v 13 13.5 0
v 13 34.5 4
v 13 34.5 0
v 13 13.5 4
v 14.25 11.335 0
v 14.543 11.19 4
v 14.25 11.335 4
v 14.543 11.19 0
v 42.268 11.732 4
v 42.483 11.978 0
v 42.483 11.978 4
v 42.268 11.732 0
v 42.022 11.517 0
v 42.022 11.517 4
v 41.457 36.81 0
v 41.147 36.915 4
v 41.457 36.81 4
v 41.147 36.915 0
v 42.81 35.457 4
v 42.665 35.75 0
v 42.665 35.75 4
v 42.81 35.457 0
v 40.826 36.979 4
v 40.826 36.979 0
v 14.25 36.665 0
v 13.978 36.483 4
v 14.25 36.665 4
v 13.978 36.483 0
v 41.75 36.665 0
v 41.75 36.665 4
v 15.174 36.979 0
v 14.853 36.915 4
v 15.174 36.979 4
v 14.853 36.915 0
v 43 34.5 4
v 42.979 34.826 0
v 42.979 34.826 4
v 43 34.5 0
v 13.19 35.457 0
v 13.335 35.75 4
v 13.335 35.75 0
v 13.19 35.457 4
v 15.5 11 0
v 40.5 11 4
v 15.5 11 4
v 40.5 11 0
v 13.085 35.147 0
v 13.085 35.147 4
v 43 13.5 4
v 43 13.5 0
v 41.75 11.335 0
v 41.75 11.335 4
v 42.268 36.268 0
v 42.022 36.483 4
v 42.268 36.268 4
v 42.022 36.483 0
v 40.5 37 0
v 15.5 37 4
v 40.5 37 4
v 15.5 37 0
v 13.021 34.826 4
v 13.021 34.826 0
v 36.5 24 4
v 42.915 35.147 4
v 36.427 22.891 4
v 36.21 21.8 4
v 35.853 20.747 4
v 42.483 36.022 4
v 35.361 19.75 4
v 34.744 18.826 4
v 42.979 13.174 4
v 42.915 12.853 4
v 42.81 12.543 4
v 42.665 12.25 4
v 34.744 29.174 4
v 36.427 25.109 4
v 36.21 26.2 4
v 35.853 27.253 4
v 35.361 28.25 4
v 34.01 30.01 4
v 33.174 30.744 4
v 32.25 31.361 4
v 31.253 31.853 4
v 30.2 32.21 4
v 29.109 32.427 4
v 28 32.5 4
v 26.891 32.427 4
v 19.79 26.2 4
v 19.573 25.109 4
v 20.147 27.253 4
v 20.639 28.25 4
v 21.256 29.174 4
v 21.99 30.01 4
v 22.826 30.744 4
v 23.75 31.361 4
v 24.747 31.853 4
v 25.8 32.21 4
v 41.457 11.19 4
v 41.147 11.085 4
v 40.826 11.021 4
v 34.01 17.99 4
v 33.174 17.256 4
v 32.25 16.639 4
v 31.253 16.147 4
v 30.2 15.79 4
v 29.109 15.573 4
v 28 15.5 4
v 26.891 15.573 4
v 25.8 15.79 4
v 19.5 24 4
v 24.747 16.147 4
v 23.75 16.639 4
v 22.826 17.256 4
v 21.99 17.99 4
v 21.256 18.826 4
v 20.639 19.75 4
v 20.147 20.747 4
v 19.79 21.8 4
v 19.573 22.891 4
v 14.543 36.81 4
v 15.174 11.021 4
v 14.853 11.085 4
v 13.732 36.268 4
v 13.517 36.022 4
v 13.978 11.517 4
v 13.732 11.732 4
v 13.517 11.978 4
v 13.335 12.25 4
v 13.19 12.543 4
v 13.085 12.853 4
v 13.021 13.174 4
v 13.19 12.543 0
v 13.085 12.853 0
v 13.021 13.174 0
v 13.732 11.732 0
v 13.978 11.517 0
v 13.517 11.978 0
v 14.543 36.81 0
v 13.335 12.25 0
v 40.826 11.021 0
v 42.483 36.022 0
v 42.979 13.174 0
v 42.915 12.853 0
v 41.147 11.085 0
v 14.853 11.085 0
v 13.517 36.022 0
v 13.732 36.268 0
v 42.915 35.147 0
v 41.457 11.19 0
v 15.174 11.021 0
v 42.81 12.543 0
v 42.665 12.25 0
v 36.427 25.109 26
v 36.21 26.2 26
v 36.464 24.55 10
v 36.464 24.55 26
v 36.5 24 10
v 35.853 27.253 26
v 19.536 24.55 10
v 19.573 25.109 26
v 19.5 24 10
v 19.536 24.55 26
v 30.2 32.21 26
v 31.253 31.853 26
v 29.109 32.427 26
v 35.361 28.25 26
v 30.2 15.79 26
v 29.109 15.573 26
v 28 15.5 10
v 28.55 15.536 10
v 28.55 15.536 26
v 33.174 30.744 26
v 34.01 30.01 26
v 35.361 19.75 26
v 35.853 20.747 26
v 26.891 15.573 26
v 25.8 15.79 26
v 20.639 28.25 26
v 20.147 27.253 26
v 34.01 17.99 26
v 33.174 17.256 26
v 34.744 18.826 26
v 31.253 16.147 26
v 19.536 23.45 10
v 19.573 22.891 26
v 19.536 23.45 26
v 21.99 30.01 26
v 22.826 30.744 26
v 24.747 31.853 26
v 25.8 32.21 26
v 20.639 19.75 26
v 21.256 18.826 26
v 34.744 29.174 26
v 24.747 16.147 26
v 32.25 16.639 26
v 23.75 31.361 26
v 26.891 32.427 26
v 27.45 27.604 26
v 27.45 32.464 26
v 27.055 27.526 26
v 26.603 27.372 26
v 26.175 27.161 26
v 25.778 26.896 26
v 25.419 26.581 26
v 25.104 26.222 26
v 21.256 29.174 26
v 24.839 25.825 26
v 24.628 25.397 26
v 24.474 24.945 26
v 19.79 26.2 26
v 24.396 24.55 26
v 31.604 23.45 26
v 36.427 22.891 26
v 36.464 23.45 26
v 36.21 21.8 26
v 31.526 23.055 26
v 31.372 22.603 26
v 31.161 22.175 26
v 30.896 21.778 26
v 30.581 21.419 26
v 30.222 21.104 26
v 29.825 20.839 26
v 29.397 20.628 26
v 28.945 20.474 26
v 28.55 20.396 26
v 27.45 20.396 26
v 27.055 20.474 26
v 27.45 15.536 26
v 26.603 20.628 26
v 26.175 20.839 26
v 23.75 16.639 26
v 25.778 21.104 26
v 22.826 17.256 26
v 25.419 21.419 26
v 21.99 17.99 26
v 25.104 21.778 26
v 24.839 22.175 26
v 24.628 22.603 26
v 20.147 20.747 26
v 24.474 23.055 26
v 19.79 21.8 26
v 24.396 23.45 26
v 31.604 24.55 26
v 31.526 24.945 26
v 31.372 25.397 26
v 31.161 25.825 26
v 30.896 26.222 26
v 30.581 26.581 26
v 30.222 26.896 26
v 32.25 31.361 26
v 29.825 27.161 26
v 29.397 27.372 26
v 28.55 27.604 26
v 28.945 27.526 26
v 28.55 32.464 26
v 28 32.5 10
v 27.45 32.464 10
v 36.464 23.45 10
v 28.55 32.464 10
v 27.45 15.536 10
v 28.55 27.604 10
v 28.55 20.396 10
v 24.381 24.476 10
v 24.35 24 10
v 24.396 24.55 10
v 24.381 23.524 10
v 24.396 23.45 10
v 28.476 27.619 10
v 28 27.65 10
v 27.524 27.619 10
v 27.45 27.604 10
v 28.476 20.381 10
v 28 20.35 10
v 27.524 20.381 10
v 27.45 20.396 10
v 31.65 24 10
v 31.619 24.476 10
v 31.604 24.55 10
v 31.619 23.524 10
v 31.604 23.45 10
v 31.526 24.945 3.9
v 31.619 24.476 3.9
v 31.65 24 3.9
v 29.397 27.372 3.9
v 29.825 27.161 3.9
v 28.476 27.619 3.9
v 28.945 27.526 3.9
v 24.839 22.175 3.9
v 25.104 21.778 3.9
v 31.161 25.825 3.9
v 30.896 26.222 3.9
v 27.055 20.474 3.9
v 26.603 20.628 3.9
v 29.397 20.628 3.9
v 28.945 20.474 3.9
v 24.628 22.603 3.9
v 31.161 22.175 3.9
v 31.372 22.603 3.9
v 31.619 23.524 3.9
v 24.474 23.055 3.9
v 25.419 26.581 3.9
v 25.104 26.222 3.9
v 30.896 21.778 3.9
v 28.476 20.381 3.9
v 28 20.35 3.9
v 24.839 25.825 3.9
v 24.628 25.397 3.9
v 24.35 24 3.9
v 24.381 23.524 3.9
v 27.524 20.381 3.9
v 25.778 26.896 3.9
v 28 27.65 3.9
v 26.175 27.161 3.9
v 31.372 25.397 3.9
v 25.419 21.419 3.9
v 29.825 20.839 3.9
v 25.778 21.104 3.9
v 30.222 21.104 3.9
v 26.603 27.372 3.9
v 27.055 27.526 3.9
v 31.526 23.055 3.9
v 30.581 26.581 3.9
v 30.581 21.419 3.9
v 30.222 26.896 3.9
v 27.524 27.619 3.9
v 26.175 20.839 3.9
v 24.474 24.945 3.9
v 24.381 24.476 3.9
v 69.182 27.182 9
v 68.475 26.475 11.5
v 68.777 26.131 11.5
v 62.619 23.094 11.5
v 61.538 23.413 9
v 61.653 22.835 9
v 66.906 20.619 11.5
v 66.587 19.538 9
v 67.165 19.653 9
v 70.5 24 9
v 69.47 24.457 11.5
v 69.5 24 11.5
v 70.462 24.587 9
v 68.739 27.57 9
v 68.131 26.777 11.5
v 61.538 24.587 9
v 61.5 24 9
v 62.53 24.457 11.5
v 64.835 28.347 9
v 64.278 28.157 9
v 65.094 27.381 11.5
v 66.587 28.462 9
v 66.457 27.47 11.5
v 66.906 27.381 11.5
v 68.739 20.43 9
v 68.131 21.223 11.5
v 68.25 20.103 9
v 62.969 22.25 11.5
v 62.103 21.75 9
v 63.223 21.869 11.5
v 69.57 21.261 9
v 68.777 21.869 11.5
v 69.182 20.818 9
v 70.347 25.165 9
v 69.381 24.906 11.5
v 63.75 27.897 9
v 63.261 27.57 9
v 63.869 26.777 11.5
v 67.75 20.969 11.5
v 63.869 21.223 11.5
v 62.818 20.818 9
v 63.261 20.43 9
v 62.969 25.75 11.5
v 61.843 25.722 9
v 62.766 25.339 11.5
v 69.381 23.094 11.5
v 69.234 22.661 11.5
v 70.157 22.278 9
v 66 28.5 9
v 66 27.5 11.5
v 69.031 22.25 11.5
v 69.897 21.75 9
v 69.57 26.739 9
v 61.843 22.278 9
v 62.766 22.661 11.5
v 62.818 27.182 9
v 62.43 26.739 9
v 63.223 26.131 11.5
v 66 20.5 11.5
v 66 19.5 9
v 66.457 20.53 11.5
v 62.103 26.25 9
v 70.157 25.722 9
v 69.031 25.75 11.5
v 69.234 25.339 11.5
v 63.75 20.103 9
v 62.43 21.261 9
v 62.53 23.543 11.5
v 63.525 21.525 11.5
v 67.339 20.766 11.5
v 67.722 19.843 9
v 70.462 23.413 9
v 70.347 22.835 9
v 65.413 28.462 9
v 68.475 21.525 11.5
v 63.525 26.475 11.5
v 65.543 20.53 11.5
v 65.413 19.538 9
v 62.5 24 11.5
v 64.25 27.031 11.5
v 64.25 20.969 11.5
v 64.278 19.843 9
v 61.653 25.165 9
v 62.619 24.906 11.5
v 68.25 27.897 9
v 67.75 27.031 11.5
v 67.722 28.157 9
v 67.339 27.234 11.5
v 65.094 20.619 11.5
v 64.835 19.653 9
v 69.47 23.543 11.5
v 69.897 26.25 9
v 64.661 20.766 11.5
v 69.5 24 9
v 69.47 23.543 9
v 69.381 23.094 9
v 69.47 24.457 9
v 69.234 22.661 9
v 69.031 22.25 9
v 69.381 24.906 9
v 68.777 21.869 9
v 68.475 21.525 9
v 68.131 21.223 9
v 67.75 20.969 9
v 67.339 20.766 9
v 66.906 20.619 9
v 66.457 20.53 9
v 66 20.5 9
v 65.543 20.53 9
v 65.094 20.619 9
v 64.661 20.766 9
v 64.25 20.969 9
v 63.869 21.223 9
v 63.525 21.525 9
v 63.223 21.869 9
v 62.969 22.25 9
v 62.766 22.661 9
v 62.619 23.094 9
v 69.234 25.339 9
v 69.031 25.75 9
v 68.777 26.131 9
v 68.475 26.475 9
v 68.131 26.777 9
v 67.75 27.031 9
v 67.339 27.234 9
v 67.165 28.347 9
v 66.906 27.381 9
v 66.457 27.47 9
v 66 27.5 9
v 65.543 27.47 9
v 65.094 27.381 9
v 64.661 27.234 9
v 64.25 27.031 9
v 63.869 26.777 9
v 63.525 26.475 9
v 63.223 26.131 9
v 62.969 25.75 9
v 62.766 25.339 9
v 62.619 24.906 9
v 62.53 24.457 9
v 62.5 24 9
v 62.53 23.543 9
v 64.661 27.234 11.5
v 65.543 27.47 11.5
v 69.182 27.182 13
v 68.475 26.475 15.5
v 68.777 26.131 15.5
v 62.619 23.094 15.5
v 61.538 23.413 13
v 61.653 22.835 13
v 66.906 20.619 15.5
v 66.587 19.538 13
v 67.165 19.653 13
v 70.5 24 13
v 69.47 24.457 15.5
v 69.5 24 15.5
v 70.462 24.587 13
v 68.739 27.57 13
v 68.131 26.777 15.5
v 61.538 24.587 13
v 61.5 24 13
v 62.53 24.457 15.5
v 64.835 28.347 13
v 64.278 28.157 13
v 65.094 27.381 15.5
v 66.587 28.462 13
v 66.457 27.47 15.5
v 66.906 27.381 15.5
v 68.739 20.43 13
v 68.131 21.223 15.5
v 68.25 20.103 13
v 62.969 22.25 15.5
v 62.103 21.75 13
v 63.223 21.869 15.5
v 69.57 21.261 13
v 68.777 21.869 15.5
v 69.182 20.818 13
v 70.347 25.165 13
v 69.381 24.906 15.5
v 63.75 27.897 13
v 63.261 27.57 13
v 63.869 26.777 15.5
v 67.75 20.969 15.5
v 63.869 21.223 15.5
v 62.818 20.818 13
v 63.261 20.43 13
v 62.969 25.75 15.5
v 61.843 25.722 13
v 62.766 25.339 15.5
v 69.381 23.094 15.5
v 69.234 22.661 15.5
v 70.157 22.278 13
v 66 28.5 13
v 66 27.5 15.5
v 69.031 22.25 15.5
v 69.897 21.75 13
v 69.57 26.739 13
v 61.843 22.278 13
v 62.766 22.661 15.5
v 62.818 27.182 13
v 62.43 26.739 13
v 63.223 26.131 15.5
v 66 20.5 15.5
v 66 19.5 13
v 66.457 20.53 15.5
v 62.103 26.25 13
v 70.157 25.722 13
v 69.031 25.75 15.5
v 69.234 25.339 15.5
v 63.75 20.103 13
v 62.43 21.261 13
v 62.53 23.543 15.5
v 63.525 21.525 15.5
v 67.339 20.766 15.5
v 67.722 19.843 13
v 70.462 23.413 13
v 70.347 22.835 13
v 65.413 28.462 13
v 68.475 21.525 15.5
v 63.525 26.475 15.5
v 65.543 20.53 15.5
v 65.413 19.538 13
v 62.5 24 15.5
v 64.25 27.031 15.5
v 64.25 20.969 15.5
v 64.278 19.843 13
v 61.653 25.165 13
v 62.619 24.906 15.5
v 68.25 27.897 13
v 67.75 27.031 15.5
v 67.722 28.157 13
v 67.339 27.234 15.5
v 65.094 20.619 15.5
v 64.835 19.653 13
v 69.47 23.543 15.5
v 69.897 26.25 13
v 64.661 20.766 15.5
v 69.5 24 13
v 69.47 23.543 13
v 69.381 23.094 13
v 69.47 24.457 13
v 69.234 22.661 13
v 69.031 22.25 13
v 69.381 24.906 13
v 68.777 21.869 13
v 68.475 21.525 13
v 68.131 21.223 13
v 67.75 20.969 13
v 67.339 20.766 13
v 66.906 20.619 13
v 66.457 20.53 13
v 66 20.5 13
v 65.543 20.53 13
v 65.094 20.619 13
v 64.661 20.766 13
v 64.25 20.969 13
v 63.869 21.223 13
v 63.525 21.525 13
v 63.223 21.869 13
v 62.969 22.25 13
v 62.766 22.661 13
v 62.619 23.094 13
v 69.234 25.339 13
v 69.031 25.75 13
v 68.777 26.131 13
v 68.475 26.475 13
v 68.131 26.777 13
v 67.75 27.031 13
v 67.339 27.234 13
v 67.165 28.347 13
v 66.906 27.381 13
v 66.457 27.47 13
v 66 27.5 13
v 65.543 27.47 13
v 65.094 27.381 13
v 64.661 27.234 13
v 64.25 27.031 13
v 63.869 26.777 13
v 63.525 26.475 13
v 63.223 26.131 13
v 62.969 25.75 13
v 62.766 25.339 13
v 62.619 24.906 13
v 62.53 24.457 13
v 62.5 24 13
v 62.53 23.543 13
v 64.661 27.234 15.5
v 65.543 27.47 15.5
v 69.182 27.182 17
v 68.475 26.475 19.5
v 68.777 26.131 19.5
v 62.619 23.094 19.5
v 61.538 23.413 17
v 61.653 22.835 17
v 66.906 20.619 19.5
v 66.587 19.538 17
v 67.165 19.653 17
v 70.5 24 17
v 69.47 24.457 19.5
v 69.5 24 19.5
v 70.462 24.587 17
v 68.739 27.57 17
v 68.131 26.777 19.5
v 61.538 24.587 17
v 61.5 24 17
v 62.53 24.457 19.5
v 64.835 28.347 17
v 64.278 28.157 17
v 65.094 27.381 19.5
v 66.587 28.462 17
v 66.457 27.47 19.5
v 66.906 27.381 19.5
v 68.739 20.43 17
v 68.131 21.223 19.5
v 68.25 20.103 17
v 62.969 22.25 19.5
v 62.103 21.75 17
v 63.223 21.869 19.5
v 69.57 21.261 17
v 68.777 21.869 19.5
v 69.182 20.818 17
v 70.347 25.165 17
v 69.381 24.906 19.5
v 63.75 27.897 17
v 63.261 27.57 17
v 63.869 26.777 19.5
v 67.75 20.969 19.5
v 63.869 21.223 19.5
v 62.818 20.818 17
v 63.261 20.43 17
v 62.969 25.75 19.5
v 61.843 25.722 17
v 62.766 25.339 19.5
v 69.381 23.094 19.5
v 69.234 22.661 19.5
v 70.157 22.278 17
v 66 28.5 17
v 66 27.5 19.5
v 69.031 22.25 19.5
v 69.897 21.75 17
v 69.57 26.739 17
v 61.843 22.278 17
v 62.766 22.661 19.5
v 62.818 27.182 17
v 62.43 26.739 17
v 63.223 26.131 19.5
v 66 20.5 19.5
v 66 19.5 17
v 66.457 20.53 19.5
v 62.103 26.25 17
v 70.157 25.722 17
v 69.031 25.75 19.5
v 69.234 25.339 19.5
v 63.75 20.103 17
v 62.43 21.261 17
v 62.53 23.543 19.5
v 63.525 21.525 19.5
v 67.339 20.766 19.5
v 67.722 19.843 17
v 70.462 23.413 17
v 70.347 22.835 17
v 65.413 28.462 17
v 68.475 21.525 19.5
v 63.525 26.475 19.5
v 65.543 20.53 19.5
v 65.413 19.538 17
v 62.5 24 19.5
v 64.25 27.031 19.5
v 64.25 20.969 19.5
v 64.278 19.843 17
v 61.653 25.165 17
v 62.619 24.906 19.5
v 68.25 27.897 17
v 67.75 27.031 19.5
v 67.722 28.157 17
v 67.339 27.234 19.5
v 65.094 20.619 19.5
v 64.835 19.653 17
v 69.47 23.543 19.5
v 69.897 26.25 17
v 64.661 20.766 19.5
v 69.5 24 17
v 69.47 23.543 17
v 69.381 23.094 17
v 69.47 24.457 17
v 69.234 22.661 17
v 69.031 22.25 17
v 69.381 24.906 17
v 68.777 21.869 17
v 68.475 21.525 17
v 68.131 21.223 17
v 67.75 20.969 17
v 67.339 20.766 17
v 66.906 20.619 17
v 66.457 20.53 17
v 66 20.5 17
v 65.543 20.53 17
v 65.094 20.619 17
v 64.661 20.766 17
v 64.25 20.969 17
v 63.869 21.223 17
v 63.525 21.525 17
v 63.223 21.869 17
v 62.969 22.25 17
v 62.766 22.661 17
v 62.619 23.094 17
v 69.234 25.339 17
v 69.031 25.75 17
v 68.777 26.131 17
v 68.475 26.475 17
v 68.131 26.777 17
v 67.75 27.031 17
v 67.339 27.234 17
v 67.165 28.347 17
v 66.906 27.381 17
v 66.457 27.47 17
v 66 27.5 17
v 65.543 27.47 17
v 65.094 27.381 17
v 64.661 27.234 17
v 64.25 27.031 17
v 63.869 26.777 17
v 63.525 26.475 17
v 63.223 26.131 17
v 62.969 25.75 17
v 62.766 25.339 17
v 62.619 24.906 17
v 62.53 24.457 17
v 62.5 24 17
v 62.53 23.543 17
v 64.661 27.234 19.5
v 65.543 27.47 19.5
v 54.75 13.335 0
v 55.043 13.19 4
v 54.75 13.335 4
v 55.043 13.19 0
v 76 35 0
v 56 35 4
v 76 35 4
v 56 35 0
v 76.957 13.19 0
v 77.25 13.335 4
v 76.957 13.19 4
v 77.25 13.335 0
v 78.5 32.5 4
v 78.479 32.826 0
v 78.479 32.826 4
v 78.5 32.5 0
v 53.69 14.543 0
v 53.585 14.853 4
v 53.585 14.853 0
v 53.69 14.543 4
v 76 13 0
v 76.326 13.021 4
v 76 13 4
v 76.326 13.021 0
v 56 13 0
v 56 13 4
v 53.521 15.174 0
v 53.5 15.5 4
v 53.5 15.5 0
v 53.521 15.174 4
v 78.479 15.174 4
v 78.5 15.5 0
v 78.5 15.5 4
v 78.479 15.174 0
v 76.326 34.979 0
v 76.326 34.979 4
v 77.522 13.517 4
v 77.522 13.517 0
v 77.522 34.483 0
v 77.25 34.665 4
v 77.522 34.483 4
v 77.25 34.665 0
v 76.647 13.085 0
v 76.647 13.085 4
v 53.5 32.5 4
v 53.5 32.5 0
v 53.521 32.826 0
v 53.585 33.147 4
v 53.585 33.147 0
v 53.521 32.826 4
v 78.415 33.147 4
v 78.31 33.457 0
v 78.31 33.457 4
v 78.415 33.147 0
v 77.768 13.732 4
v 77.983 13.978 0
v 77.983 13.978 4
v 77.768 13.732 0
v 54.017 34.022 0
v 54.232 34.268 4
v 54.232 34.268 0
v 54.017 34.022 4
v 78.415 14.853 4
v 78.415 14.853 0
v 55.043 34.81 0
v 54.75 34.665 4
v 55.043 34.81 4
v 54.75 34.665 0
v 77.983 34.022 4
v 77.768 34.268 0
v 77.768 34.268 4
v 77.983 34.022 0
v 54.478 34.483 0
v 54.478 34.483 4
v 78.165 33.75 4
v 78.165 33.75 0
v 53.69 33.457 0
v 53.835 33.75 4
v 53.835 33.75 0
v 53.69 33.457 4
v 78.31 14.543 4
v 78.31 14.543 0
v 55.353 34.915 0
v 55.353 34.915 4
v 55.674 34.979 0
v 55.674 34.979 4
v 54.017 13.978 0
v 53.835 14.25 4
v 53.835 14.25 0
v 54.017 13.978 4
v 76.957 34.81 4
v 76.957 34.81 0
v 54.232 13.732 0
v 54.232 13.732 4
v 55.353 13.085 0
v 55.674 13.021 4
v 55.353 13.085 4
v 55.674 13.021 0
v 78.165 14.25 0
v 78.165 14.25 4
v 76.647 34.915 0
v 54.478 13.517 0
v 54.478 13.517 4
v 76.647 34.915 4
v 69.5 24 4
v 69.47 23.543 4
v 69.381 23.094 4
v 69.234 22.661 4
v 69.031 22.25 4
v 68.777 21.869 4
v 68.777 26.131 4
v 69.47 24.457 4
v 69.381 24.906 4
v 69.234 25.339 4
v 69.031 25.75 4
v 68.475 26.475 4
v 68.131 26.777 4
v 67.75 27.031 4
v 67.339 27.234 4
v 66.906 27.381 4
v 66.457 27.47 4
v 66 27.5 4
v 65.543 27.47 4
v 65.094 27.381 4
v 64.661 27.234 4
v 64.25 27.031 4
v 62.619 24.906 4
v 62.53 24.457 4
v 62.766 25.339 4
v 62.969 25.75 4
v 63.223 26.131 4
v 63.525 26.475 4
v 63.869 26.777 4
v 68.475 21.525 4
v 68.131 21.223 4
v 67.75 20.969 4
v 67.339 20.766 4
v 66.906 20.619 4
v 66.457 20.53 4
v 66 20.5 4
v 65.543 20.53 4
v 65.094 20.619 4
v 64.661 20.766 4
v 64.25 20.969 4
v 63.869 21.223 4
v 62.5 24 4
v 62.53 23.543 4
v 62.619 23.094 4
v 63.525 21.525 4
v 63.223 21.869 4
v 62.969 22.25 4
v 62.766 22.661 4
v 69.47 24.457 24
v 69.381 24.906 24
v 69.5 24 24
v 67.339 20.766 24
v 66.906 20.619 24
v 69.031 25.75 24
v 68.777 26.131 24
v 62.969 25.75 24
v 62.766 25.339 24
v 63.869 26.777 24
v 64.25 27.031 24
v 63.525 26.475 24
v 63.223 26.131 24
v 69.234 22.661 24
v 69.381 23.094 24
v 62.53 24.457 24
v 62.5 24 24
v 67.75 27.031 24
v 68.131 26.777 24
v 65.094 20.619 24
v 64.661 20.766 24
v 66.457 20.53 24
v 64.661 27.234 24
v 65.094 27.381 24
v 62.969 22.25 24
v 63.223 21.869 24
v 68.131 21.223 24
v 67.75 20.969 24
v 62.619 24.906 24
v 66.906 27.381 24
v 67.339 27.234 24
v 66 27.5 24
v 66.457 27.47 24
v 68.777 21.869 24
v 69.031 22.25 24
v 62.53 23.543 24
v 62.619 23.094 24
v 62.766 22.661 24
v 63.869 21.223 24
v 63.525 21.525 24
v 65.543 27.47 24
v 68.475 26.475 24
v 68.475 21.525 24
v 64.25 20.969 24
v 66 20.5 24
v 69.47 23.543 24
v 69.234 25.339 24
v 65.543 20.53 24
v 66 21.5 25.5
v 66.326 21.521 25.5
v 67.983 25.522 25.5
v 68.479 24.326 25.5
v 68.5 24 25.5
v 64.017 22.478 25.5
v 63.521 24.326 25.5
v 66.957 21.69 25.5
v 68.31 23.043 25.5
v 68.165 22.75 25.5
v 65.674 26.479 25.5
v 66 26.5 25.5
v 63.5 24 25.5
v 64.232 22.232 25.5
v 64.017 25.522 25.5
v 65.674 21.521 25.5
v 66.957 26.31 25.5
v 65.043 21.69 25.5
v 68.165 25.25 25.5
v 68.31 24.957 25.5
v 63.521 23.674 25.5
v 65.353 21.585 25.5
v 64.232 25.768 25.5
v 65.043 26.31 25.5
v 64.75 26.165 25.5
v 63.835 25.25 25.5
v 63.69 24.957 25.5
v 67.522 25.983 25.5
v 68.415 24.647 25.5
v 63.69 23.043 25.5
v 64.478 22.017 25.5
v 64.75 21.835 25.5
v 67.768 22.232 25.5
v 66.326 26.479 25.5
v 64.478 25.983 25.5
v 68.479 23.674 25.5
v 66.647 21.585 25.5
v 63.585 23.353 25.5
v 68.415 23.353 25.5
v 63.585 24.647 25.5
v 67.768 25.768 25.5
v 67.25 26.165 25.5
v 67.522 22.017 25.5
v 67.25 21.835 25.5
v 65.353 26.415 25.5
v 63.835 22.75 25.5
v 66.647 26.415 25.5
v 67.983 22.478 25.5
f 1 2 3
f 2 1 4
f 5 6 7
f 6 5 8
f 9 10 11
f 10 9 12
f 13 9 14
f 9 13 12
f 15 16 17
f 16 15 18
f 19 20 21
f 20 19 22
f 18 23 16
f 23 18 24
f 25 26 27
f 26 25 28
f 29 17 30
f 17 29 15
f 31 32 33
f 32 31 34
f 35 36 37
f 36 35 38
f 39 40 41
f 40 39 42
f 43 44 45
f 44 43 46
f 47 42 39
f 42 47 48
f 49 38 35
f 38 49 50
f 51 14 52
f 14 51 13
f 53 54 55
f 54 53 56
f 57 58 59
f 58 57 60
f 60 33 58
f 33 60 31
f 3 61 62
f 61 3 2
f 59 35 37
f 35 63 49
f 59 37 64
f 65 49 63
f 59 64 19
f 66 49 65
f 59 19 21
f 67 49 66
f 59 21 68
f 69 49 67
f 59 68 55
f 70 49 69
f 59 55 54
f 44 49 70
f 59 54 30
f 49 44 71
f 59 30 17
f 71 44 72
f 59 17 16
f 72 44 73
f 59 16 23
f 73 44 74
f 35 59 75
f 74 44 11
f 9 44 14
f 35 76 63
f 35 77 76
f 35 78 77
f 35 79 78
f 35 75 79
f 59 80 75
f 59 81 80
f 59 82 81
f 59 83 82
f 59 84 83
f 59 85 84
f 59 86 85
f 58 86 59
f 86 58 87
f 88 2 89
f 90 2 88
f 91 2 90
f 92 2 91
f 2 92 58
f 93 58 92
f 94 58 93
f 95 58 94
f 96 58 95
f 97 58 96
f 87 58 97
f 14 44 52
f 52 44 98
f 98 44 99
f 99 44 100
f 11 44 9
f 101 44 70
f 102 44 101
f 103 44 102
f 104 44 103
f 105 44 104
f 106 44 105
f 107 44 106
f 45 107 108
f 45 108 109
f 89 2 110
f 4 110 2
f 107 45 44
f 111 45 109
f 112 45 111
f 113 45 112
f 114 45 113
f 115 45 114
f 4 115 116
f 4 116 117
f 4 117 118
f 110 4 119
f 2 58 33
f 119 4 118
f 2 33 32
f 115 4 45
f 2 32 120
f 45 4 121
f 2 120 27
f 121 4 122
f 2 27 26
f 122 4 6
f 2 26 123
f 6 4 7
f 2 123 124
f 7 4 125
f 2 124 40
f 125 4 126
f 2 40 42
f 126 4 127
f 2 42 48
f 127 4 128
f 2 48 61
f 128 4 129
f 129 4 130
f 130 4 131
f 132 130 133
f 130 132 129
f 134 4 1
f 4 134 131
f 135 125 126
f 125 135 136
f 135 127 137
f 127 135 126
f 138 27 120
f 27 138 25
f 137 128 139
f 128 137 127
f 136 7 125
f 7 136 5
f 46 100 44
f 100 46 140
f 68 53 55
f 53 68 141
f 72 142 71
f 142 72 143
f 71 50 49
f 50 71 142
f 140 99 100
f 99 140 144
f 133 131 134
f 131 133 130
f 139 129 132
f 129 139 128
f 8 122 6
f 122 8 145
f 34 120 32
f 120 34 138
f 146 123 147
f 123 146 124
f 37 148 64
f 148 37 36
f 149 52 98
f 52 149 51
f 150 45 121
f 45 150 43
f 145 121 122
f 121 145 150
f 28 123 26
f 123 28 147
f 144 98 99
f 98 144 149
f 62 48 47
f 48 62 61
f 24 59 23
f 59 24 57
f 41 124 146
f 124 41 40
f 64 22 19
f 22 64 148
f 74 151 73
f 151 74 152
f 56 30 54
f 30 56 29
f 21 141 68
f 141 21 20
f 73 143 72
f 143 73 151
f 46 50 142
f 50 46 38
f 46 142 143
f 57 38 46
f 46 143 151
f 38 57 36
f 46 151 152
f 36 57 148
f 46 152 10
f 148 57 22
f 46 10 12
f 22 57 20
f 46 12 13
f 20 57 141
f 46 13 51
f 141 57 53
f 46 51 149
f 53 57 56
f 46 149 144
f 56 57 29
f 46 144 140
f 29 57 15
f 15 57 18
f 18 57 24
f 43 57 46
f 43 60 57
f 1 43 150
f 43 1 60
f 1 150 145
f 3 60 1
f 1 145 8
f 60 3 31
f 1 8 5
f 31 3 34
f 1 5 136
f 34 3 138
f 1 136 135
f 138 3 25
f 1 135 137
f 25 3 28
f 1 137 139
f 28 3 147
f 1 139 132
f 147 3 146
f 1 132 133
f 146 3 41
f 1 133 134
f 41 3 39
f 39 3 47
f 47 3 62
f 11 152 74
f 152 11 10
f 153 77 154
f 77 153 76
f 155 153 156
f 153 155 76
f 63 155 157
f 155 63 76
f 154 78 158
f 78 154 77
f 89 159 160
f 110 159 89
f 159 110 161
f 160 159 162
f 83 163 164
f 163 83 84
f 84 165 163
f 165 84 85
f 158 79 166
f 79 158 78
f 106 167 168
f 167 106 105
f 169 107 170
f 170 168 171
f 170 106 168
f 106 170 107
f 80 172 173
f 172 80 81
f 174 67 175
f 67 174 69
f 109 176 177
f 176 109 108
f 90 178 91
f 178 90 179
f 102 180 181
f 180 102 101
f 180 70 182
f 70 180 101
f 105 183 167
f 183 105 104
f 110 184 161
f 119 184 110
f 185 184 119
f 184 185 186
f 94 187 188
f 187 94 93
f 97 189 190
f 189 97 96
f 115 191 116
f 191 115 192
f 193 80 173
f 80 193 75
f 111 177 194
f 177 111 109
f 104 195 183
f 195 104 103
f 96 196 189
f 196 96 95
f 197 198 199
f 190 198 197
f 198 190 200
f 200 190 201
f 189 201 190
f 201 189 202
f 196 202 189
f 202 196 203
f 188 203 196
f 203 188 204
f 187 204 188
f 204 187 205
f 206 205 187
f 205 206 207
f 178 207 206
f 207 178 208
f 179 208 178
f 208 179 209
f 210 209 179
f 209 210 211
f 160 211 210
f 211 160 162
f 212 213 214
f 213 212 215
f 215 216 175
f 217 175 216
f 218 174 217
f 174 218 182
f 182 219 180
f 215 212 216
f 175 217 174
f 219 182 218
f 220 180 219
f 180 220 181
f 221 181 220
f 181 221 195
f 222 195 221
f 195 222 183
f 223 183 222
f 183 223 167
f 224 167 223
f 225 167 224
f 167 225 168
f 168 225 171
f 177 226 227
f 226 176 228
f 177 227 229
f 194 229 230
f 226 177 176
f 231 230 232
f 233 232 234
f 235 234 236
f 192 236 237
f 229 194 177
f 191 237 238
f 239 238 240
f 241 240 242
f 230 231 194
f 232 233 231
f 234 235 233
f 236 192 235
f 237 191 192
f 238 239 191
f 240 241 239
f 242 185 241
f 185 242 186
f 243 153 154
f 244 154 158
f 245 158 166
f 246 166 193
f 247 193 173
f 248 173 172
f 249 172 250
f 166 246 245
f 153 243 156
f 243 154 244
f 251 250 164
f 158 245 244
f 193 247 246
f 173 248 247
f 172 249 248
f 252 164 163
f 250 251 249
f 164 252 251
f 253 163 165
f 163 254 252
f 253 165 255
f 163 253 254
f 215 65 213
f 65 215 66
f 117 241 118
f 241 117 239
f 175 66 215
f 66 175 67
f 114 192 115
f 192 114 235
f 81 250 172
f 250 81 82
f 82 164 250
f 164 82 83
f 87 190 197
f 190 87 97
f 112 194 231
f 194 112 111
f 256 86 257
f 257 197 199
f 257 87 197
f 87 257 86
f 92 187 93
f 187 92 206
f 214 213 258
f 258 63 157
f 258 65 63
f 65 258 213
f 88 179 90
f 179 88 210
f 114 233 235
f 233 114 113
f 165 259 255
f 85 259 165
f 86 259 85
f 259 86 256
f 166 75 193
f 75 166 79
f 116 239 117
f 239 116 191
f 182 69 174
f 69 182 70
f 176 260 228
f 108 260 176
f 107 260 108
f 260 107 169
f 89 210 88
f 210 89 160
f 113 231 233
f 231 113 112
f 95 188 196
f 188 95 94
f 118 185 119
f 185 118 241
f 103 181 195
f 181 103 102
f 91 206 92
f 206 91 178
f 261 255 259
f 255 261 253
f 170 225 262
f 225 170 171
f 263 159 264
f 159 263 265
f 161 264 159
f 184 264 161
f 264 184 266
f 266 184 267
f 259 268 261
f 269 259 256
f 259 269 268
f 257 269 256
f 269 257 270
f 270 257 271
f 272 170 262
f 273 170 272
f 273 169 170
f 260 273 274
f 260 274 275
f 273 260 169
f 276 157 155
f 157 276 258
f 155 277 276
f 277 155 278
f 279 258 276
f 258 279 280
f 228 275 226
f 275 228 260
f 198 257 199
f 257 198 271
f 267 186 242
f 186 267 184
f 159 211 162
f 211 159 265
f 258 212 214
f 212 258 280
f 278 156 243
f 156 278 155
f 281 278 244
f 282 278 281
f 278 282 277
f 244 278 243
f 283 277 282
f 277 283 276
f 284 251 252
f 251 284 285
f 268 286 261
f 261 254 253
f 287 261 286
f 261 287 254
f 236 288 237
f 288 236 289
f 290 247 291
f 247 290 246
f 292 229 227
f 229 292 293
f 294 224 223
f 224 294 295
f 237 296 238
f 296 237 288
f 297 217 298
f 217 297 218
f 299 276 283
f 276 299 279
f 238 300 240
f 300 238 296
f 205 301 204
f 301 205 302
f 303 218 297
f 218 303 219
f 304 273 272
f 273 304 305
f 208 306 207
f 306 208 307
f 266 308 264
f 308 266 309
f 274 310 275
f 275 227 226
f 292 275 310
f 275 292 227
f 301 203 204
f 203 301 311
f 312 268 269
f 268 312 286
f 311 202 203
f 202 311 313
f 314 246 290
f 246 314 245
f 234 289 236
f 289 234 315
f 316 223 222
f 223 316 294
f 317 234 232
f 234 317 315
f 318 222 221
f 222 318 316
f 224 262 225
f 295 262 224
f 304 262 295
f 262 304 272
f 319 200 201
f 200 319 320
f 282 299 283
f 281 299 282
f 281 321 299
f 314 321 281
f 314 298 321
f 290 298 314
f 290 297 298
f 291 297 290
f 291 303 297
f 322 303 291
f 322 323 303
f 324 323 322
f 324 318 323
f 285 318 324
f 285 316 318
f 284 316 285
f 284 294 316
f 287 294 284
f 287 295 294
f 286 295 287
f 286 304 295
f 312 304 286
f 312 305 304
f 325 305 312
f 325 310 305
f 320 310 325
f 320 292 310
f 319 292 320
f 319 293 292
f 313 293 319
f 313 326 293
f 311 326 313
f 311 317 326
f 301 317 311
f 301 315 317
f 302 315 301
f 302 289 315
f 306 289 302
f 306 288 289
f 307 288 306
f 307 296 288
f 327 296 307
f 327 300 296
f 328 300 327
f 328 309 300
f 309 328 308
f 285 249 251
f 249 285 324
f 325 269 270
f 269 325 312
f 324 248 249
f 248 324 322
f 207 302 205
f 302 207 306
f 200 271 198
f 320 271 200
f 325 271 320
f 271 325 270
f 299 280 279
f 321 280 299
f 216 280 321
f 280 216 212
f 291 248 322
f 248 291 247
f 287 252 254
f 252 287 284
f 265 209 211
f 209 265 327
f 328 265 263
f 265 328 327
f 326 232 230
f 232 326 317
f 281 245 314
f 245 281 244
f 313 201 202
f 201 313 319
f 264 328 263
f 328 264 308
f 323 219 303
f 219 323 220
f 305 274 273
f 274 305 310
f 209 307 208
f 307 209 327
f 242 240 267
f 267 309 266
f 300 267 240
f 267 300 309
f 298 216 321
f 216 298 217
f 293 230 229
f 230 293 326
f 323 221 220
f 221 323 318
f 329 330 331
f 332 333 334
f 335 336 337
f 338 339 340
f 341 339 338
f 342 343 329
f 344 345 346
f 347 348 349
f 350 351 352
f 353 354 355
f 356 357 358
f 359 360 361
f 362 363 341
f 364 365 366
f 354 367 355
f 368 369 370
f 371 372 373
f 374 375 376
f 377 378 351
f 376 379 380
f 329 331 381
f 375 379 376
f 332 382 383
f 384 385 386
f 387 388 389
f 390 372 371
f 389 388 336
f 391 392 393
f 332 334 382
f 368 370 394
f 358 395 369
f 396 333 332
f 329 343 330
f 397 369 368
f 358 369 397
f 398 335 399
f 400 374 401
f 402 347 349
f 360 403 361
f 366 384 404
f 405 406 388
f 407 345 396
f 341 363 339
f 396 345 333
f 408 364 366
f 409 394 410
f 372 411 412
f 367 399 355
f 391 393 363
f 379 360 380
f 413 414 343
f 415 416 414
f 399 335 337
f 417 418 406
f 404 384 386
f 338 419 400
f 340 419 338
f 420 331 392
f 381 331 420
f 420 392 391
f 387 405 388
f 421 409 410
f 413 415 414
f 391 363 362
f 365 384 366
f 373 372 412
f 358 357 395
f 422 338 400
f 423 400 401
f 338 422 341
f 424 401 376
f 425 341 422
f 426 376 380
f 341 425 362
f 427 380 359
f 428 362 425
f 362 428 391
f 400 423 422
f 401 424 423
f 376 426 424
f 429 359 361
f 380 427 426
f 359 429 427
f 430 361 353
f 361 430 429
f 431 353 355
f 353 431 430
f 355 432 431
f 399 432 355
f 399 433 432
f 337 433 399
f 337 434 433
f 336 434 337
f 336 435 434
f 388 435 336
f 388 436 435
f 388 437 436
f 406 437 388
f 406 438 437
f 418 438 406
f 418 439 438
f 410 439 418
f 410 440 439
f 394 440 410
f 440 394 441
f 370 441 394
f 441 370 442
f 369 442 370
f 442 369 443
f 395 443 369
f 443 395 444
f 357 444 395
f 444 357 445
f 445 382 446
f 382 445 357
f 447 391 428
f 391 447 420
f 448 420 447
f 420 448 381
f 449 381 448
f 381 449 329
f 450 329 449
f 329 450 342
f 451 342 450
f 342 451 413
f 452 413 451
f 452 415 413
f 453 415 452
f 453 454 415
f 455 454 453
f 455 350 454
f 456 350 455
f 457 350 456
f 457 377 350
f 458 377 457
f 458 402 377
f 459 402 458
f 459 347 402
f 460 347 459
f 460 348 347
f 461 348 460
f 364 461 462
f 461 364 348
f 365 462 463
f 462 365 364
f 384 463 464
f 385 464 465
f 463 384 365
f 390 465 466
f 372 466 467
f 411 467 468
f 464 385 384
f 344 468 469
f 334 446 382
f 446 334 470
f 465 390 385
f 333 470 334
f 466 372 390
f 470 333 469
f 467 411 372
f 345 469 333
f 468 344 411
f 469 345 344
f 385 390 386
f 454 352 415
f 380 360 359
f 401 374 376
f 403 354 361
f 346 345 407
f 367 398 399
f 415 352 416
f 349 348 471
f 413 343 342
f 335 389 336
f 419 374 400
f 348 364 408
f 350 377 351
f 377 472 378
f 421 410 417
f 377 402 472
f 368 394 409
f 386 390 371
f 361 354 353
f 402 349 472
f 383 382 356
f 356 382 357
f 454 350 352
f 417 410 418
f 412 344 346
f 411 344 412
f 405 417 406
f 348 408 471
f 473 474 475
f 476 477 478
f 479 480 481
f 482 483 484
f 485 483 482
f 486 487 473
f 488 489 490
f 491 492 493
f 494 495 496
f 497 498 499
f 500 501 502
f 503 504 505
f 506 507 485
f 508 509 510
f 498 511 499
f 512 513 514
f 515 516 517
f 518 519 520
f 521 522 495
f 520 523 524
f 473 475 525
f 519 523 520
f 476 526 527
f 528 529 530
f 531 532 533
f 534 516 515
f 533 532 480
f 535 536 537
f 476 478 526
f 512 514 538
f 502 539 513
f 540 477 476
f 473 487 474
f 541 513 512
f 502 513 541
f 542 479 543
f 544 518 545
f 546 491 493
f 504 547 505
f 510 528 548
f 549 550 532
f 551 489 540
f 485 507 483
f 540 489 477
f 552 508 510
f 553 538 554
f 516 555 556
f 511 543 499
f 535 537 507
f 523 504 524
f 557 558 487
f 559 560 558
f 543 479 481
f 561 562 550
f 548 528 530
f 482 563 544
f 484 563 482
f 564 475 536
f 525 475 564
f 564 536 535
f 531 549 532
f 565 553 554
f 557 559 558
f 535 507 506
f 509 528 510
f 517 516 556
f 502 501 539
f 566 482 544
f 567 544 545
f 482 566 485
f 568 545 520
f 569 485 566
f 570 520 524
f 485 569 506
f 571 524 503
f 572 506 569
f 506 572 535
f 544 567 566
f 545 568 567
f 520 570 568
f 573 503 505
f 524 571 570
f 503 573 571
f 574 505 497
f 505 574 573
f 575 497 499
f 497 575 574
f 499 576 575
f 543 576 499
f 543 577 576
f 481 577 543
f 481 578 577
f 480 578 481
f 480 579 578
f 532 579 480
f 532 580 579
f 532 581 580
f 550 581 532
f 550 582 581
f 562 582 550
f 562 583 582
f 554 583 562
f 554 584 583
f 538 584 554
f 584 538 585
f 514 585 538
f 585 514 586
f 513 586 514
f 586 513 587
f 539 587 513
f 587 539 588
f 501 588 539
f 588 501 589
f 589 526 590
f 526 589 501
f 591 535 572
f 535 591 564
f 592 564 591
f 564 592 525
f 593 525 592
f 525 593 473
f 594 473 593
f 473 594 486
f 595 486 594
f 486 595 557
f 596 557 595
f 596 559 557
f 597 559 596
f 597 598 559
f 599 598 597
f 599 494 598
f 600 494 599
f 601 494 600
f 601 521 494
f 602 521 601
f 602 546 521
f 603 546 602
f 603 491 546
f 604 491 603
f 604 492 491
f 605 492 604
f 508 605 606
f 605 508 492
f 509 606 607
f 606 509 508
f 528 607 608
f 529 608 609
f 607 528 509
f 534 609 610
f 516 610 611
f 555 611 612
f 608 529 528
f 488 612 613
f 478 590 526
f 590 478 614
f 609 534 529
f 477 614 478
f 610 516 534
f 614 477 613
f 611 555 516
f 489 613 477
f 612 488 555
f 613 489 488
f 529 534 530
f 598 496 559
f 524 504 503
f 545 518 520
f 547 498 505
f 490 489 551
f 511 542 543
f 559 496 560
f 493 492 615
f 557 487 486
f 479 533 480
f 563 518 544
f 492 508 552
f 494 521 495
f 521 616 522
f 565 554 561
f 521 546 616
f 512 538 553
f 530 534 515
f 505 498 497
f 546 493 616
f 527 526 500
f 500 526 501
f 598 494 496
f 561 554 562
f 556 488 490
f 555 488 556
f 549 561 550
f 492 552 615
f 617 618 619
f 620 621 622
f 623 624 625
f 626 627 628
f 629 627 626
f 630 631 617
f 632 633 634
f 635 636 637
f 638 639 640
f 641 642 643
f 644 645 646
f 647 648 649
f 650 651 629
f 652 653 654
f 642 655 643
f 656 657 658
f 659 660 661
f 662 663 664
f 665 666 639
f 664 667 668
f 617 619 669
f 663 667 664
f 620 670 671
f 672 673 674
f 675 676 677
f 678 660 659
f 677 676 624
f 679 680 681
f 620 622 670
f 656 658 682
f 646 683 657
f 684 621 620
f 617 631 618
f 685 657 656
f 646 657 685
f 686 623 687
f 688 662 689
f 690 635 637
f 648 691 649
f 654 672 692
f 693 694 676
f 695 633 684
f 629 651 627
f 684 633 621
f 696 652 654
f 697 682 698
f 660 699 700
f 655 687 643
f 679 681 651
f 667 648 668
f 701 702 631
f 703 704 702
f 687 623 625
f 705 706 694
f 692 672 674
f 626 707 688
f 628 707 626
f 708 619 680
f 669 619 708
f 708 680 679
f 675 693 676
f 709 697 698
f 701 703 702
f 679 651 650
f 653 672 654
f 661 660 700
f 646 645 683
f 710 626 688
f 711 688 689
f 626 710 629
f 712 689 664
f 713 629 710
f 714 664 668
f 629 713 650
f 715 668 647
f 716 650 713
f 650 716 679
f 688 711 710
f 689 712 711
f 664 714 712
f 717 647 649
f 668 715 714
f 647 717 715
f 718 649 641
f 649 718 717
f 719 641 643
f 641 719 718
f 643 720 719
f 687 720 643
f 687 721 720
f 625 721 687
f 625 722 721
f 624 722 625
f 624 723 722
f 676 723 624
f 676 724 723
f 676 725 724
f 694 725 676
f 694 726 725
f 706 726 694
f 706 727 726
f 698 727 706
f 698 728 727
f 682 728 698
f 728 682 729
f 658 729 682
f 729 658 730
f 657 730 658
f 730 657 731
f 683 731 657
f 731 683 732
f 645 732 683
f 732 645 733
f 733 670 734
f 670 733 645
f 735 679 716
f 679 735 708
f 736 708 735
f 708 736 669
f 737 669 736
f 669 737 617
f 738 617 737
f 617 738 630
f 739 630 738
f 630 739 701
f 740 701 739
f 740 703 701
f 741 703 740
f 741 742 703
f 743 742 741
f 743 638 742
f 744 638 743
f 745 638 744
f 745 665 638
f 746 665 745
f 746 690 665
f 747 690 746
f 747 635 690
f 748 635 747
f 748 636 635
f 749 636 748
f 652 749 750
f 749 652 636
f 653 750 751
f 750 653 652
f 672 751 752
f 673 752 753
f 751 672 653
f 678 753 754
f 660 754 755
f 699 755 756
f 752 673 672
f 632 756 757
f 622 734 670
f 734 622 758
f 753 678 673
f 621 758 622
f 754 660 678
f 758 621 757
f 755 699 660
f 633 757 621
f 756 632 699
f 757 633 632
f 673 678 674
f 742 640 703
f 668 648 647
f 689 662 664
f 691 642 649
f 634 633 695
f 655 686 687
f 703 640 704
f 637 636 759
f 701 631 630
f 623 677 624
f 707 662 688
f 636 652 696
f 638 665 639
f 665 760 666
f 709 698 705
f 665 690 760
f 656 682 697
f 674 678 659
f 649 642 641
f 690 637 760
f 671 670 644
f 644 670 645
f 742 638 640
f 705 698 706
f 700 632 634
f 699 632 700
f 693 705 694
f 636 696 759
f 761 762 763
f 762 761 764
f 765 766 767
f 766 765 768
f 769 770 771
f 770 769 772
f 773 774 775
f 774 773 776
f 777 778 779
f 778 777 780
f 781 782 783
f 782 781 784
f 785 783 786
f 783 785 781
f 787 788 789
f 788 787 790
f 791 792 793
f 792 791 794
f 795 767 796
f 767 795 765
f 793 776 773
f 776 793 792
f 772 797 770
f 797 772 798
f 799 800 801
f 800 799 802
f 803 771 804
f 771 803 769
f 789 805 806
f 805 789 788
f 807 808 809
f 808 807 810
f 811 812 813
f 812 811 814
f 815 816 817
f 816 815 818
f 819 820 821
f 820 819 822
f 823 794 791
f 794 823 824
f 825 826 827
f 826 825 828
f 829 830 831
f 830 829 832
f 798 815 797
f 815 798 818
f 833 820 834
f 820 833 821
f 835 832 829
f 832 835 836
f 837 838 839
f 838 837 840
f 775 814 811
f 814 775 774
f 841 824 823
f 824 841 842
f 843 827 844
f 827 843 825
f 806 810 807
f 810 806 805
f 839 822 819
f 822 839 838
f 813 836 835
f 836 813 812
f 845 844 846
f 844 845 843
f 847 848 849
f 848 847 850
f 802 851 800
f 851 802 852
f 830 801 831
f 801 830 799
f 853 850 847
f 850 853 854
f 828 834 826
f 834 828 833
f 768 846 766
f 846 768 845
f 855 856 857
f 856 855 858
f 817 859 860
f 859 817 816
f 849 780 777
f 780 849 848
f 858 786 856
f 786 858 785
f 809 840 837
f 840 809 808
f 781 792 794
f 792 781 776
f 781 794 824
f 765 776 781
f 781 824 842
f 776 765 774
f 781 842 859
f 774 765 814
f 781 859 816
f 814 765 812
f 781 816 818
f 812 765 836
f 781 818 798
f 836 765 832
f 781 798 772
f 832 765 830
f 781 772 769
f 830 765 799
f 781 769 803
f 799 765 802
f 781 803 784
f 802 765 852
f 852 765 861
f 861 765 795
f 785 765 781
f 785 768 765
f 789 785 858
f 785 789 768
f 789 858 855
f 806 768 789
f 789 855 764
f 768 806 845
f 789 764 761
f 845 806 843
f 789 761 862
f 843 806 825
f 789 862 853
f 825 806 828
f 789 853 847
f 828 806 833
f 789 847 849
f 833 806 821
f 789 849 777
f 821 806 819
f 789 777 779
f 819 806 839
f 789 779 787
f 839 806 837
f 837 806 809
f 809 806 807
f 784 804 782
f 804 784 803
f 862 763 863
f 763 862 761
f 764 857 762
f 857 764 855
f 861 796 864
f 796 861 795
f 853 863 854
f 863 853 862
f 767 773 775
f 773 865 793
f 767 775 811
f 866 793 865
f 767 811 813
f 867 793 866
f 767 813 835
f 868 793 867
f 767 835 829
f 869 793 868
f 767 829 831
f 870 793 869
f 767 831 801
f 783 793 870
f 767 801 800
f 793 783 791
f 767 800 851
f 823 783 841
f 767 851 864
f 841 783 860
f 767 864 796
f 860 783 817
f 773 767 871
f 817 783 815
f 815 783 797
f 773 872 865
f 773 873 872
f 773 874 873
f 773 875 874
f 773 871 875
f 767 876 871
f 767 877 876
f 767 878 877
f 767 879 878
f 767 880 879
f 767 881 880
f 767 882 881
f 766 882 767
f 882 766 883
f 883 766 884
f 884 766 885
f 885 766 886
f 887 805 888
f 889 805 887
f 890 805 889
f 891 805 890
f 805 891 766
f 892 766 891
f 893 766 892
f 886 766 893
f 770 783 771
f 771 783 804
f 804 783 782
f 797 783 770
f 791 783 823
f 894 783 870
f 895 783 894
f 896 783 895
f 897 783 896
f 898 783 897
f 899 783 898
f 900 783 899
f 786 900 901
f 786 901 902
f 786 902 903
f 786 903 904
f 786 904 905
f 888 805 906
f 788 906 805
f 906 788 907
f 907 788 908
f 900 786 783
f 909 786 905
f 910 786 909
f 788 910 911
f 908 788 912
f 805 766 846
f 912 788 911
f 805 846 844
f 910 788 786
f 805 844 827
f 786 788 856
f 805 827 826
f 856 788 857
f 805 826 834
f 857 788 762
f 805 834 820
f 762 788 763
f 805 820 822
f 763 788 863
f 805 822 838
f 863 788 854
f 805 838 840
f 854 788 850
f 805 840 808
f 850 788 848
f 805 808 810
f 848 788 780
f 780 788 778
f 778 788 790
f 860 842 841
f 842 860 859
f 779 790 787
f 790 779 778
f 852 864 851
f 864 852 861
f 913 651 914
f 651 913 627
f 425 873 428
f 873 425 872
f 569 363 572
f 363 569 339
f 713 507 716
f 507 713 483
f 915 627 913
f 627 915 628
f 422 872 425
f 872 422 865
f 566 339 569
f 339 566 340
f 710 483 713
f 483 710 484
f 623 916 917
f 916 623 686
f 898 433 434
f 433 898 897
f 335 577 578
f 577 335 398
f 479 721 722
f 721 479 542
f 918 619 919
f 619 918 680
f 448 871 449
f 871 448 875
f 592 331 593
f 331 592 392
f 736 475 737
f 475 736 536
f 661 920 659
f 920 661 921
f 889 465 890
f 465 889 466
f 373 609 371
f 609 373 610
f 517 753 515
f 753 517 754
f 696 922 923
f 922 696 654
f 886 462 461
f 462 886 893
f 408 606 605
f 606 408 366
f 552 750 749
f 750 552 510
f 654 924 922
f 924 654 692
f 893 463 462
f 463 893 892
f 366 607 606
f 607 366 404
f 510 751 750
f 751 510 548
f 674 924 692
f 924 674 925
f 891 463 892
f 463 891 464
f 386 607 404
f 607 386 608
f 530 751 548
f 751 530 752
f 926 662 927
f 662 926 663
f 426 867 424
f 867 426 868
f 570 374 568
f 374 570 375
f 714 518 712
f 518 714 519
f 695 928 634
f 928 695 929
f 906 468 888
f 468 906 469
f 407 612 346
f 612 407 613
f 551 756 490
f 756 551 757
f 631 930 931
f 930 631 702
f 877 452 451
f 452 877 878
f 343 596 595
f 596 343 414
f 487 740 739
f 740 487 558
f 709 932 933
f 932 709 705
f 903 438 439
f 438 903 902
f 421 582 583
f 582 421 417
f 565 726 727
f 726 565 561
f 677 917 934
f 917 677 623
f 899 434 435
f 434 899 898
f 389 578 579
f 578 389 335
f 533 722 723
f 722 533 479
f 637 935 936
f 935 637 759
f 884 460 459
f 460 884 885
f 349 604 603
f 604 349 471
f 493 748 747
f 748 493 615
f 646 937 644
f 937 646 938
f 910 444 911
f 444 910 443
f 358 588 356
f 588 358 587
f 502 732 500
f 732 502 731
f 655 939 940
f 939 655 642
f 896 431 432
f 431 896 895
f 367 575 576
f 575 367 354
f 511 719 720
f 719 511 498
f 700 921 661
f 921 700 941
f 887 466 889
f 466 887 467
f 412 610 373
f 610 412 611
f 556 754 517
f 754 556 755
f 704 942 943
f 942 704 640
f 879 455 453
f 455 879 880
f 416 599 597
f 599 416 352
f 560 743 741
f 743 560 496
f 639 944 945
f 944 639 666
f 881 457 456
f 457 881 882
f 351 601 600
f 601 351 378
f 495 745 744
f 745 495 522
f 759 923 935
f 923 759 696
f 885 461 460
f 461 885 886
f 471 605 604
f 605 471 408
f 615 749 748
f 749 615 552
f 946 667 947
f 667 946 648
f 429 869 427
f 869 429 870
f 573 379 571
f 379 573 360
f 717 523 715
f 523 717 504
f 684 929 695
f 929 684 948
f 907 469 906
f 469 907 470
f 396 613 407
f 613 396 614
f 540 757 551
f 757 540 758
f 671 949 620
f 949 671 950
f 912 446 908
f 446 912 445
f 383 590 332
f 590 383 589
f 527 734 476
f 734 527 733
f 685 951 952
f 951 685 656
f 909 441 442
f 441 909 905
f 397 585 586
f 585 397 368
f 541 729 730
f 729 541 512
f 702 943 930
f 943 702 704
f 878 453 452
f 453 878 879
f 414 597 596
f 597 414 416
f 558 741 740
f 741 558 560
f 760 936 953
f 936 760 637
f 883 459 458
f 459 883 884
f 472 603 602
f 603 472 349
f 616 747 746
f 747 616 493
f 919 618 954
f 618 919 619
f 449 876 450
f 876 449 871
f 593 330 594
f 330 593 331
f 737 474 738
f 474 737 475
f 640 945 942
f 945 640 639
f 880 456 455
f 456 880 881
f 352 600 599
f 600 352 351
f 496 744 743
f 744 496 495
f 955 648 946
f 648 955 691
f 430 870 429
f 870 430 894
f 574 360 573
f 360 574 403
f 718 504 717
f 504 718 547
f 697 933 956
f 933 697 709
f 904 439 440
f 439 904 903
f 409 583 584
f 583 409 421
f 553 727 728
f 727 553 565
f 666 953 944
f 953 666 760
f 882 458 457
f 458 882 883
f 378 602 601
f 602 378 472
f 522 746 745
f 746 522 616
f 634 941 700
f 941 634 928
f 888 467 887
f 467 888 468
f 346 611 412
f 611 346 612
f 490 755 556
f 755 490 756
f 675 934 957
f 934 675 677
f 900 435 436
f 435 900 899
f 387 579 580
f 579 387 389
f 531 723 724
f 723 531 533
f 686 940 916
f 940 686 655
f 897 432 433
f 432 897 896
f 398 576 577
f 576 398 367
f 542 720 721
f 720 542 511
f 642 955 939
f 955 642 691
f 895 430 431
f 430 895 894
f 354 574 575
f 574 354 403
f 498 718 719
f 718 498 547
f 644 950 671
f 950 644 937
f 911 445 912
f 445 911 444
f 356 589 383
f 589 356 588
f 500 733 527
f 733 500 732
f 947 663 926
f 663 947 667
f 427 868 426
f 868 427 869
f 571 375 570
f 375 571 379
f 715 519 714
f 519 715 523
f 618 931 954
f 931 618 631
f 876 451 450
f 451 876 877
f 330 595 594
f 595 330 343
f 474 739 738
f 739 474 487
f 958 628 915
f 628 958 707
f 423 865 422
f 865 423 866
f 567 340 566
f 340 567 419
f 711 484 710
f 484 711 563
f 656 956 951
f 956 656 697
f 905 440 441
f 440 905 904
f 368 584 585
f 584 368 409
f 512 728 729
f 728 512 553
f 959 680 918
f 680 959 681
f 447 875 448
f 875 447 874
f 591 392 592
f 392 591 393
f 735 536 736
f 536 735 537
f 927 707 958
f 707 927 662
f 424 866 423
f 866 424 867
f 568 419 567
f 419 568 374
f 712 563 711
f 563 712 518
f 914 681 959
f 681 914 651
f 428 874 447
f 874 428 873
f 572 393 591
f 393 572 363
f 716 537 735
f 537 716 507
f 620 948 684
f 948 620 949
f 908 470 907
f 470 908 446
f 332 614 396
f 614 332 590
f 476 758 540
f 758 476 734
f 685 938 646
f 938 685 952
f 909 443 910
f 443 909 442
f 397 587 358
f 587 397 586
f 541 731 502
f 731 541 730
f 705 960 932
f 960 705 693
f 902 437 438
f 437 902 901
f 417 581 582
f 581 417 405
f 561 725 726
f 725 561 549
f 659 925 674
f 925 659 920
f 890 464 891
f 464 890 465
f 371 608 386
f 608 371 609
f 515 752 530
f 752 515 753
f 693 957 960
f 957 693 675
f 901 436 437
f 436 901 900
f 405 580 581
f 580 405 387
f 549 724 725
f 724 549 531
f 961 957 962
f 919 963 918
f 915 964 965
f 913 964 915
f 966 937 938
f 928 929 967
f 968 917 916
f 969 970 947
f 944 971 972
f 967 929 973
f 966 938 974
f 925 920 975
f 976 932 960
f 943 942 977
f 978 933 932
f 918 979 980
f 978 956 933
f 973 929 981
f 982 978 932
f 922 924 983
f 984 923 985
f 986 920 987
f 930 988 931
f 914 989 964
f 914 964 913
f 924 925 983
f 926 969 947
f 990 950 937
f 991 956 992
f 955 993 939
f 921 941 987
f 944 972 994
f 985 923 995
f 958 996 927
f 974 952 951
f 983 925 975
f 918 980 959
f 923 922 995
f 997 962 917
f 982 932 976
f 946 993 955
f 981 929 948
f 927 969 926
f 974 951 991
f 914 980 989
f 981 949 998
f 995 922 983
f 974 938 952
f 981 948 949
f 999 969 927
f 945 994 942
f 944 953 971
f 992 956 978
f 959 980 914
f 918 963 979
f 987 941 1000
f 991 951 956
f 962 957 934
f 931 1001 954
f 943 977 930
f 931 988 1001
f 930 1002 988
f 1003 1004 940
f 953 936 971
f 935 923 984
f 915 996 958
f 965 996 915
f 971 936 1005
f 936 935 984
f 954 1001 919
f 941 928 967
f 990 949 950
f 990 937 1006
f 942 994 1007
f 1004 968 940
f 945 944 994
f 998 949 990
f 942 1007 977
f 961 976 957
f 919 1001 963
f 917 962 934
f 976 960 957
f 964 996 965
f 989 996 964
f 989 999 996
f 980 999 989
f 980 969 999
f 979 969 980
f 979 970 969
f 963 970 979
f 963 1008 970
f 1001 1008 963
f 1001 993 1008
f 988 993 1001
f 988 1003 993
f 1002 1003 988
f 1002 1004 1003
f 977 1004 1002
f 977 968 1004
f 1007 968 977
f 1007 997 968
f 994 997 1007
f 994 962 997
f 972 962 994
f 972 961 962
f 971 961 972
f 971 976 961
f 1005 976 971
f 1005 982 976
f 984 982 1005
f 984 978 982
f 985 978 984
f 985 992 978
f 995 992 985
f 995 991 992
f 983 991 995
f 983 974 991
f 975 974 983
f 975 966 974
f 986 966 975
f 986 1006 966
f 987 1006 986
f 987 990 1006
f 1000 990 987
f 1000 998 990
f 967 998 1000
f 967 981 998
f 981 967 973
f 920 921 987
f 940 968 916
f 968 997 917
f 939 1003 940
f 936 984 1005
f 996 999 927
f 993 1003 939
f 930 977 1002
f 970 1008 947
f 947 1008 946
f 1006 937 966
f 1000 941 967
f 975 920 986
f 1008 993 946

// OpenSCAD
/*
Sample 045: Einweg-Steckverbinder mit Widerhaken — 0,15 mm
Generated from the FDM Mechanical Sample Library.
Units: millimetres.

Override examples:
  openscad -o custom.stl -D 'view="plate"' -D 'render_fn=64' model.scad
  openscad -o preview.png -D 'view="assembly"' model.scad
*/
use <../../../library/fdm_mechanisms.scad>

render_fn = is_undef(render_fn) ? 48 : render_fn;
view = is_undef(view) ? "plate" : view;
$fn = render_fn;

sample_barbed_connector(
    view=view,
    clearance=0.15,
    pin_d=7,
    barb_h=1
);
